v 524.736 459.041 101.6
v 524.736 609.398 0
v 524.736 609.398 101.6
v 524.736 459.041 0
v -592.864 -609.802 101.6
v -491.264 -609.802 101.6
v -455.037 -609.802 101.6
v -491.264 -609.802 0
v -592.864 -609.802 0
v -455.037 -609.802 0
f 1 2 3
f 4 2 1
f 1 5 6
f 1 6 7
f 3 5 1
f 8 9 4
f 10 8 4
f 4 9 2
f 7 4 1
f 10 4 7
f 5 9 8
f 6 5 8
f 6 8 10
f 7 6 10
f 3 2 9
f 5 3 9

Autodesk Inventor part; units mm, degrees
ref_plane "YZ Plane" through (0, 0, 0) normal (1, 0, 0) x (0, 1, 0)
ref_plane "XZ Plane" through (0, 0, 0) normal (0, 1, 0) x (-1, 0, 0)
ref_plane "XY Plane" through (0, 0, 0) normal (0, 0, 1) x (1, 0, 0)
sketch "Sketch1" plane through (0, 0, 0) normal (0, 0, 1) x (1, 0, 0)
  line L0 (-592.8645, -609.8015) -> (-491.2645, -609.8015)
  line L1 (524.7355, 609.3985) -> (-592.8645, -609.8015)
  line L2 (524.7355, 609.3985) -> (599.6304, 540.7448) construction
  line L3 (524.7355, 459.0414) -> (-455.0371, -609.8015)
  line L4 (-592.8645, -609.8015) -> (-455.0371, -609.8015)
  line L5 (-592.8645, -609.8015) -> (-455.0371, -609.8015)
  line L6 (524.7355, 609.3985) -> (524.7355, 459.0414)
  point P0 (0, 0)
  dimension "d0" = 101.6
extrude "Extrusion1" add sketch "Sketch1" along normal blind 101.6
properties part number "4x4xidkanymore"
